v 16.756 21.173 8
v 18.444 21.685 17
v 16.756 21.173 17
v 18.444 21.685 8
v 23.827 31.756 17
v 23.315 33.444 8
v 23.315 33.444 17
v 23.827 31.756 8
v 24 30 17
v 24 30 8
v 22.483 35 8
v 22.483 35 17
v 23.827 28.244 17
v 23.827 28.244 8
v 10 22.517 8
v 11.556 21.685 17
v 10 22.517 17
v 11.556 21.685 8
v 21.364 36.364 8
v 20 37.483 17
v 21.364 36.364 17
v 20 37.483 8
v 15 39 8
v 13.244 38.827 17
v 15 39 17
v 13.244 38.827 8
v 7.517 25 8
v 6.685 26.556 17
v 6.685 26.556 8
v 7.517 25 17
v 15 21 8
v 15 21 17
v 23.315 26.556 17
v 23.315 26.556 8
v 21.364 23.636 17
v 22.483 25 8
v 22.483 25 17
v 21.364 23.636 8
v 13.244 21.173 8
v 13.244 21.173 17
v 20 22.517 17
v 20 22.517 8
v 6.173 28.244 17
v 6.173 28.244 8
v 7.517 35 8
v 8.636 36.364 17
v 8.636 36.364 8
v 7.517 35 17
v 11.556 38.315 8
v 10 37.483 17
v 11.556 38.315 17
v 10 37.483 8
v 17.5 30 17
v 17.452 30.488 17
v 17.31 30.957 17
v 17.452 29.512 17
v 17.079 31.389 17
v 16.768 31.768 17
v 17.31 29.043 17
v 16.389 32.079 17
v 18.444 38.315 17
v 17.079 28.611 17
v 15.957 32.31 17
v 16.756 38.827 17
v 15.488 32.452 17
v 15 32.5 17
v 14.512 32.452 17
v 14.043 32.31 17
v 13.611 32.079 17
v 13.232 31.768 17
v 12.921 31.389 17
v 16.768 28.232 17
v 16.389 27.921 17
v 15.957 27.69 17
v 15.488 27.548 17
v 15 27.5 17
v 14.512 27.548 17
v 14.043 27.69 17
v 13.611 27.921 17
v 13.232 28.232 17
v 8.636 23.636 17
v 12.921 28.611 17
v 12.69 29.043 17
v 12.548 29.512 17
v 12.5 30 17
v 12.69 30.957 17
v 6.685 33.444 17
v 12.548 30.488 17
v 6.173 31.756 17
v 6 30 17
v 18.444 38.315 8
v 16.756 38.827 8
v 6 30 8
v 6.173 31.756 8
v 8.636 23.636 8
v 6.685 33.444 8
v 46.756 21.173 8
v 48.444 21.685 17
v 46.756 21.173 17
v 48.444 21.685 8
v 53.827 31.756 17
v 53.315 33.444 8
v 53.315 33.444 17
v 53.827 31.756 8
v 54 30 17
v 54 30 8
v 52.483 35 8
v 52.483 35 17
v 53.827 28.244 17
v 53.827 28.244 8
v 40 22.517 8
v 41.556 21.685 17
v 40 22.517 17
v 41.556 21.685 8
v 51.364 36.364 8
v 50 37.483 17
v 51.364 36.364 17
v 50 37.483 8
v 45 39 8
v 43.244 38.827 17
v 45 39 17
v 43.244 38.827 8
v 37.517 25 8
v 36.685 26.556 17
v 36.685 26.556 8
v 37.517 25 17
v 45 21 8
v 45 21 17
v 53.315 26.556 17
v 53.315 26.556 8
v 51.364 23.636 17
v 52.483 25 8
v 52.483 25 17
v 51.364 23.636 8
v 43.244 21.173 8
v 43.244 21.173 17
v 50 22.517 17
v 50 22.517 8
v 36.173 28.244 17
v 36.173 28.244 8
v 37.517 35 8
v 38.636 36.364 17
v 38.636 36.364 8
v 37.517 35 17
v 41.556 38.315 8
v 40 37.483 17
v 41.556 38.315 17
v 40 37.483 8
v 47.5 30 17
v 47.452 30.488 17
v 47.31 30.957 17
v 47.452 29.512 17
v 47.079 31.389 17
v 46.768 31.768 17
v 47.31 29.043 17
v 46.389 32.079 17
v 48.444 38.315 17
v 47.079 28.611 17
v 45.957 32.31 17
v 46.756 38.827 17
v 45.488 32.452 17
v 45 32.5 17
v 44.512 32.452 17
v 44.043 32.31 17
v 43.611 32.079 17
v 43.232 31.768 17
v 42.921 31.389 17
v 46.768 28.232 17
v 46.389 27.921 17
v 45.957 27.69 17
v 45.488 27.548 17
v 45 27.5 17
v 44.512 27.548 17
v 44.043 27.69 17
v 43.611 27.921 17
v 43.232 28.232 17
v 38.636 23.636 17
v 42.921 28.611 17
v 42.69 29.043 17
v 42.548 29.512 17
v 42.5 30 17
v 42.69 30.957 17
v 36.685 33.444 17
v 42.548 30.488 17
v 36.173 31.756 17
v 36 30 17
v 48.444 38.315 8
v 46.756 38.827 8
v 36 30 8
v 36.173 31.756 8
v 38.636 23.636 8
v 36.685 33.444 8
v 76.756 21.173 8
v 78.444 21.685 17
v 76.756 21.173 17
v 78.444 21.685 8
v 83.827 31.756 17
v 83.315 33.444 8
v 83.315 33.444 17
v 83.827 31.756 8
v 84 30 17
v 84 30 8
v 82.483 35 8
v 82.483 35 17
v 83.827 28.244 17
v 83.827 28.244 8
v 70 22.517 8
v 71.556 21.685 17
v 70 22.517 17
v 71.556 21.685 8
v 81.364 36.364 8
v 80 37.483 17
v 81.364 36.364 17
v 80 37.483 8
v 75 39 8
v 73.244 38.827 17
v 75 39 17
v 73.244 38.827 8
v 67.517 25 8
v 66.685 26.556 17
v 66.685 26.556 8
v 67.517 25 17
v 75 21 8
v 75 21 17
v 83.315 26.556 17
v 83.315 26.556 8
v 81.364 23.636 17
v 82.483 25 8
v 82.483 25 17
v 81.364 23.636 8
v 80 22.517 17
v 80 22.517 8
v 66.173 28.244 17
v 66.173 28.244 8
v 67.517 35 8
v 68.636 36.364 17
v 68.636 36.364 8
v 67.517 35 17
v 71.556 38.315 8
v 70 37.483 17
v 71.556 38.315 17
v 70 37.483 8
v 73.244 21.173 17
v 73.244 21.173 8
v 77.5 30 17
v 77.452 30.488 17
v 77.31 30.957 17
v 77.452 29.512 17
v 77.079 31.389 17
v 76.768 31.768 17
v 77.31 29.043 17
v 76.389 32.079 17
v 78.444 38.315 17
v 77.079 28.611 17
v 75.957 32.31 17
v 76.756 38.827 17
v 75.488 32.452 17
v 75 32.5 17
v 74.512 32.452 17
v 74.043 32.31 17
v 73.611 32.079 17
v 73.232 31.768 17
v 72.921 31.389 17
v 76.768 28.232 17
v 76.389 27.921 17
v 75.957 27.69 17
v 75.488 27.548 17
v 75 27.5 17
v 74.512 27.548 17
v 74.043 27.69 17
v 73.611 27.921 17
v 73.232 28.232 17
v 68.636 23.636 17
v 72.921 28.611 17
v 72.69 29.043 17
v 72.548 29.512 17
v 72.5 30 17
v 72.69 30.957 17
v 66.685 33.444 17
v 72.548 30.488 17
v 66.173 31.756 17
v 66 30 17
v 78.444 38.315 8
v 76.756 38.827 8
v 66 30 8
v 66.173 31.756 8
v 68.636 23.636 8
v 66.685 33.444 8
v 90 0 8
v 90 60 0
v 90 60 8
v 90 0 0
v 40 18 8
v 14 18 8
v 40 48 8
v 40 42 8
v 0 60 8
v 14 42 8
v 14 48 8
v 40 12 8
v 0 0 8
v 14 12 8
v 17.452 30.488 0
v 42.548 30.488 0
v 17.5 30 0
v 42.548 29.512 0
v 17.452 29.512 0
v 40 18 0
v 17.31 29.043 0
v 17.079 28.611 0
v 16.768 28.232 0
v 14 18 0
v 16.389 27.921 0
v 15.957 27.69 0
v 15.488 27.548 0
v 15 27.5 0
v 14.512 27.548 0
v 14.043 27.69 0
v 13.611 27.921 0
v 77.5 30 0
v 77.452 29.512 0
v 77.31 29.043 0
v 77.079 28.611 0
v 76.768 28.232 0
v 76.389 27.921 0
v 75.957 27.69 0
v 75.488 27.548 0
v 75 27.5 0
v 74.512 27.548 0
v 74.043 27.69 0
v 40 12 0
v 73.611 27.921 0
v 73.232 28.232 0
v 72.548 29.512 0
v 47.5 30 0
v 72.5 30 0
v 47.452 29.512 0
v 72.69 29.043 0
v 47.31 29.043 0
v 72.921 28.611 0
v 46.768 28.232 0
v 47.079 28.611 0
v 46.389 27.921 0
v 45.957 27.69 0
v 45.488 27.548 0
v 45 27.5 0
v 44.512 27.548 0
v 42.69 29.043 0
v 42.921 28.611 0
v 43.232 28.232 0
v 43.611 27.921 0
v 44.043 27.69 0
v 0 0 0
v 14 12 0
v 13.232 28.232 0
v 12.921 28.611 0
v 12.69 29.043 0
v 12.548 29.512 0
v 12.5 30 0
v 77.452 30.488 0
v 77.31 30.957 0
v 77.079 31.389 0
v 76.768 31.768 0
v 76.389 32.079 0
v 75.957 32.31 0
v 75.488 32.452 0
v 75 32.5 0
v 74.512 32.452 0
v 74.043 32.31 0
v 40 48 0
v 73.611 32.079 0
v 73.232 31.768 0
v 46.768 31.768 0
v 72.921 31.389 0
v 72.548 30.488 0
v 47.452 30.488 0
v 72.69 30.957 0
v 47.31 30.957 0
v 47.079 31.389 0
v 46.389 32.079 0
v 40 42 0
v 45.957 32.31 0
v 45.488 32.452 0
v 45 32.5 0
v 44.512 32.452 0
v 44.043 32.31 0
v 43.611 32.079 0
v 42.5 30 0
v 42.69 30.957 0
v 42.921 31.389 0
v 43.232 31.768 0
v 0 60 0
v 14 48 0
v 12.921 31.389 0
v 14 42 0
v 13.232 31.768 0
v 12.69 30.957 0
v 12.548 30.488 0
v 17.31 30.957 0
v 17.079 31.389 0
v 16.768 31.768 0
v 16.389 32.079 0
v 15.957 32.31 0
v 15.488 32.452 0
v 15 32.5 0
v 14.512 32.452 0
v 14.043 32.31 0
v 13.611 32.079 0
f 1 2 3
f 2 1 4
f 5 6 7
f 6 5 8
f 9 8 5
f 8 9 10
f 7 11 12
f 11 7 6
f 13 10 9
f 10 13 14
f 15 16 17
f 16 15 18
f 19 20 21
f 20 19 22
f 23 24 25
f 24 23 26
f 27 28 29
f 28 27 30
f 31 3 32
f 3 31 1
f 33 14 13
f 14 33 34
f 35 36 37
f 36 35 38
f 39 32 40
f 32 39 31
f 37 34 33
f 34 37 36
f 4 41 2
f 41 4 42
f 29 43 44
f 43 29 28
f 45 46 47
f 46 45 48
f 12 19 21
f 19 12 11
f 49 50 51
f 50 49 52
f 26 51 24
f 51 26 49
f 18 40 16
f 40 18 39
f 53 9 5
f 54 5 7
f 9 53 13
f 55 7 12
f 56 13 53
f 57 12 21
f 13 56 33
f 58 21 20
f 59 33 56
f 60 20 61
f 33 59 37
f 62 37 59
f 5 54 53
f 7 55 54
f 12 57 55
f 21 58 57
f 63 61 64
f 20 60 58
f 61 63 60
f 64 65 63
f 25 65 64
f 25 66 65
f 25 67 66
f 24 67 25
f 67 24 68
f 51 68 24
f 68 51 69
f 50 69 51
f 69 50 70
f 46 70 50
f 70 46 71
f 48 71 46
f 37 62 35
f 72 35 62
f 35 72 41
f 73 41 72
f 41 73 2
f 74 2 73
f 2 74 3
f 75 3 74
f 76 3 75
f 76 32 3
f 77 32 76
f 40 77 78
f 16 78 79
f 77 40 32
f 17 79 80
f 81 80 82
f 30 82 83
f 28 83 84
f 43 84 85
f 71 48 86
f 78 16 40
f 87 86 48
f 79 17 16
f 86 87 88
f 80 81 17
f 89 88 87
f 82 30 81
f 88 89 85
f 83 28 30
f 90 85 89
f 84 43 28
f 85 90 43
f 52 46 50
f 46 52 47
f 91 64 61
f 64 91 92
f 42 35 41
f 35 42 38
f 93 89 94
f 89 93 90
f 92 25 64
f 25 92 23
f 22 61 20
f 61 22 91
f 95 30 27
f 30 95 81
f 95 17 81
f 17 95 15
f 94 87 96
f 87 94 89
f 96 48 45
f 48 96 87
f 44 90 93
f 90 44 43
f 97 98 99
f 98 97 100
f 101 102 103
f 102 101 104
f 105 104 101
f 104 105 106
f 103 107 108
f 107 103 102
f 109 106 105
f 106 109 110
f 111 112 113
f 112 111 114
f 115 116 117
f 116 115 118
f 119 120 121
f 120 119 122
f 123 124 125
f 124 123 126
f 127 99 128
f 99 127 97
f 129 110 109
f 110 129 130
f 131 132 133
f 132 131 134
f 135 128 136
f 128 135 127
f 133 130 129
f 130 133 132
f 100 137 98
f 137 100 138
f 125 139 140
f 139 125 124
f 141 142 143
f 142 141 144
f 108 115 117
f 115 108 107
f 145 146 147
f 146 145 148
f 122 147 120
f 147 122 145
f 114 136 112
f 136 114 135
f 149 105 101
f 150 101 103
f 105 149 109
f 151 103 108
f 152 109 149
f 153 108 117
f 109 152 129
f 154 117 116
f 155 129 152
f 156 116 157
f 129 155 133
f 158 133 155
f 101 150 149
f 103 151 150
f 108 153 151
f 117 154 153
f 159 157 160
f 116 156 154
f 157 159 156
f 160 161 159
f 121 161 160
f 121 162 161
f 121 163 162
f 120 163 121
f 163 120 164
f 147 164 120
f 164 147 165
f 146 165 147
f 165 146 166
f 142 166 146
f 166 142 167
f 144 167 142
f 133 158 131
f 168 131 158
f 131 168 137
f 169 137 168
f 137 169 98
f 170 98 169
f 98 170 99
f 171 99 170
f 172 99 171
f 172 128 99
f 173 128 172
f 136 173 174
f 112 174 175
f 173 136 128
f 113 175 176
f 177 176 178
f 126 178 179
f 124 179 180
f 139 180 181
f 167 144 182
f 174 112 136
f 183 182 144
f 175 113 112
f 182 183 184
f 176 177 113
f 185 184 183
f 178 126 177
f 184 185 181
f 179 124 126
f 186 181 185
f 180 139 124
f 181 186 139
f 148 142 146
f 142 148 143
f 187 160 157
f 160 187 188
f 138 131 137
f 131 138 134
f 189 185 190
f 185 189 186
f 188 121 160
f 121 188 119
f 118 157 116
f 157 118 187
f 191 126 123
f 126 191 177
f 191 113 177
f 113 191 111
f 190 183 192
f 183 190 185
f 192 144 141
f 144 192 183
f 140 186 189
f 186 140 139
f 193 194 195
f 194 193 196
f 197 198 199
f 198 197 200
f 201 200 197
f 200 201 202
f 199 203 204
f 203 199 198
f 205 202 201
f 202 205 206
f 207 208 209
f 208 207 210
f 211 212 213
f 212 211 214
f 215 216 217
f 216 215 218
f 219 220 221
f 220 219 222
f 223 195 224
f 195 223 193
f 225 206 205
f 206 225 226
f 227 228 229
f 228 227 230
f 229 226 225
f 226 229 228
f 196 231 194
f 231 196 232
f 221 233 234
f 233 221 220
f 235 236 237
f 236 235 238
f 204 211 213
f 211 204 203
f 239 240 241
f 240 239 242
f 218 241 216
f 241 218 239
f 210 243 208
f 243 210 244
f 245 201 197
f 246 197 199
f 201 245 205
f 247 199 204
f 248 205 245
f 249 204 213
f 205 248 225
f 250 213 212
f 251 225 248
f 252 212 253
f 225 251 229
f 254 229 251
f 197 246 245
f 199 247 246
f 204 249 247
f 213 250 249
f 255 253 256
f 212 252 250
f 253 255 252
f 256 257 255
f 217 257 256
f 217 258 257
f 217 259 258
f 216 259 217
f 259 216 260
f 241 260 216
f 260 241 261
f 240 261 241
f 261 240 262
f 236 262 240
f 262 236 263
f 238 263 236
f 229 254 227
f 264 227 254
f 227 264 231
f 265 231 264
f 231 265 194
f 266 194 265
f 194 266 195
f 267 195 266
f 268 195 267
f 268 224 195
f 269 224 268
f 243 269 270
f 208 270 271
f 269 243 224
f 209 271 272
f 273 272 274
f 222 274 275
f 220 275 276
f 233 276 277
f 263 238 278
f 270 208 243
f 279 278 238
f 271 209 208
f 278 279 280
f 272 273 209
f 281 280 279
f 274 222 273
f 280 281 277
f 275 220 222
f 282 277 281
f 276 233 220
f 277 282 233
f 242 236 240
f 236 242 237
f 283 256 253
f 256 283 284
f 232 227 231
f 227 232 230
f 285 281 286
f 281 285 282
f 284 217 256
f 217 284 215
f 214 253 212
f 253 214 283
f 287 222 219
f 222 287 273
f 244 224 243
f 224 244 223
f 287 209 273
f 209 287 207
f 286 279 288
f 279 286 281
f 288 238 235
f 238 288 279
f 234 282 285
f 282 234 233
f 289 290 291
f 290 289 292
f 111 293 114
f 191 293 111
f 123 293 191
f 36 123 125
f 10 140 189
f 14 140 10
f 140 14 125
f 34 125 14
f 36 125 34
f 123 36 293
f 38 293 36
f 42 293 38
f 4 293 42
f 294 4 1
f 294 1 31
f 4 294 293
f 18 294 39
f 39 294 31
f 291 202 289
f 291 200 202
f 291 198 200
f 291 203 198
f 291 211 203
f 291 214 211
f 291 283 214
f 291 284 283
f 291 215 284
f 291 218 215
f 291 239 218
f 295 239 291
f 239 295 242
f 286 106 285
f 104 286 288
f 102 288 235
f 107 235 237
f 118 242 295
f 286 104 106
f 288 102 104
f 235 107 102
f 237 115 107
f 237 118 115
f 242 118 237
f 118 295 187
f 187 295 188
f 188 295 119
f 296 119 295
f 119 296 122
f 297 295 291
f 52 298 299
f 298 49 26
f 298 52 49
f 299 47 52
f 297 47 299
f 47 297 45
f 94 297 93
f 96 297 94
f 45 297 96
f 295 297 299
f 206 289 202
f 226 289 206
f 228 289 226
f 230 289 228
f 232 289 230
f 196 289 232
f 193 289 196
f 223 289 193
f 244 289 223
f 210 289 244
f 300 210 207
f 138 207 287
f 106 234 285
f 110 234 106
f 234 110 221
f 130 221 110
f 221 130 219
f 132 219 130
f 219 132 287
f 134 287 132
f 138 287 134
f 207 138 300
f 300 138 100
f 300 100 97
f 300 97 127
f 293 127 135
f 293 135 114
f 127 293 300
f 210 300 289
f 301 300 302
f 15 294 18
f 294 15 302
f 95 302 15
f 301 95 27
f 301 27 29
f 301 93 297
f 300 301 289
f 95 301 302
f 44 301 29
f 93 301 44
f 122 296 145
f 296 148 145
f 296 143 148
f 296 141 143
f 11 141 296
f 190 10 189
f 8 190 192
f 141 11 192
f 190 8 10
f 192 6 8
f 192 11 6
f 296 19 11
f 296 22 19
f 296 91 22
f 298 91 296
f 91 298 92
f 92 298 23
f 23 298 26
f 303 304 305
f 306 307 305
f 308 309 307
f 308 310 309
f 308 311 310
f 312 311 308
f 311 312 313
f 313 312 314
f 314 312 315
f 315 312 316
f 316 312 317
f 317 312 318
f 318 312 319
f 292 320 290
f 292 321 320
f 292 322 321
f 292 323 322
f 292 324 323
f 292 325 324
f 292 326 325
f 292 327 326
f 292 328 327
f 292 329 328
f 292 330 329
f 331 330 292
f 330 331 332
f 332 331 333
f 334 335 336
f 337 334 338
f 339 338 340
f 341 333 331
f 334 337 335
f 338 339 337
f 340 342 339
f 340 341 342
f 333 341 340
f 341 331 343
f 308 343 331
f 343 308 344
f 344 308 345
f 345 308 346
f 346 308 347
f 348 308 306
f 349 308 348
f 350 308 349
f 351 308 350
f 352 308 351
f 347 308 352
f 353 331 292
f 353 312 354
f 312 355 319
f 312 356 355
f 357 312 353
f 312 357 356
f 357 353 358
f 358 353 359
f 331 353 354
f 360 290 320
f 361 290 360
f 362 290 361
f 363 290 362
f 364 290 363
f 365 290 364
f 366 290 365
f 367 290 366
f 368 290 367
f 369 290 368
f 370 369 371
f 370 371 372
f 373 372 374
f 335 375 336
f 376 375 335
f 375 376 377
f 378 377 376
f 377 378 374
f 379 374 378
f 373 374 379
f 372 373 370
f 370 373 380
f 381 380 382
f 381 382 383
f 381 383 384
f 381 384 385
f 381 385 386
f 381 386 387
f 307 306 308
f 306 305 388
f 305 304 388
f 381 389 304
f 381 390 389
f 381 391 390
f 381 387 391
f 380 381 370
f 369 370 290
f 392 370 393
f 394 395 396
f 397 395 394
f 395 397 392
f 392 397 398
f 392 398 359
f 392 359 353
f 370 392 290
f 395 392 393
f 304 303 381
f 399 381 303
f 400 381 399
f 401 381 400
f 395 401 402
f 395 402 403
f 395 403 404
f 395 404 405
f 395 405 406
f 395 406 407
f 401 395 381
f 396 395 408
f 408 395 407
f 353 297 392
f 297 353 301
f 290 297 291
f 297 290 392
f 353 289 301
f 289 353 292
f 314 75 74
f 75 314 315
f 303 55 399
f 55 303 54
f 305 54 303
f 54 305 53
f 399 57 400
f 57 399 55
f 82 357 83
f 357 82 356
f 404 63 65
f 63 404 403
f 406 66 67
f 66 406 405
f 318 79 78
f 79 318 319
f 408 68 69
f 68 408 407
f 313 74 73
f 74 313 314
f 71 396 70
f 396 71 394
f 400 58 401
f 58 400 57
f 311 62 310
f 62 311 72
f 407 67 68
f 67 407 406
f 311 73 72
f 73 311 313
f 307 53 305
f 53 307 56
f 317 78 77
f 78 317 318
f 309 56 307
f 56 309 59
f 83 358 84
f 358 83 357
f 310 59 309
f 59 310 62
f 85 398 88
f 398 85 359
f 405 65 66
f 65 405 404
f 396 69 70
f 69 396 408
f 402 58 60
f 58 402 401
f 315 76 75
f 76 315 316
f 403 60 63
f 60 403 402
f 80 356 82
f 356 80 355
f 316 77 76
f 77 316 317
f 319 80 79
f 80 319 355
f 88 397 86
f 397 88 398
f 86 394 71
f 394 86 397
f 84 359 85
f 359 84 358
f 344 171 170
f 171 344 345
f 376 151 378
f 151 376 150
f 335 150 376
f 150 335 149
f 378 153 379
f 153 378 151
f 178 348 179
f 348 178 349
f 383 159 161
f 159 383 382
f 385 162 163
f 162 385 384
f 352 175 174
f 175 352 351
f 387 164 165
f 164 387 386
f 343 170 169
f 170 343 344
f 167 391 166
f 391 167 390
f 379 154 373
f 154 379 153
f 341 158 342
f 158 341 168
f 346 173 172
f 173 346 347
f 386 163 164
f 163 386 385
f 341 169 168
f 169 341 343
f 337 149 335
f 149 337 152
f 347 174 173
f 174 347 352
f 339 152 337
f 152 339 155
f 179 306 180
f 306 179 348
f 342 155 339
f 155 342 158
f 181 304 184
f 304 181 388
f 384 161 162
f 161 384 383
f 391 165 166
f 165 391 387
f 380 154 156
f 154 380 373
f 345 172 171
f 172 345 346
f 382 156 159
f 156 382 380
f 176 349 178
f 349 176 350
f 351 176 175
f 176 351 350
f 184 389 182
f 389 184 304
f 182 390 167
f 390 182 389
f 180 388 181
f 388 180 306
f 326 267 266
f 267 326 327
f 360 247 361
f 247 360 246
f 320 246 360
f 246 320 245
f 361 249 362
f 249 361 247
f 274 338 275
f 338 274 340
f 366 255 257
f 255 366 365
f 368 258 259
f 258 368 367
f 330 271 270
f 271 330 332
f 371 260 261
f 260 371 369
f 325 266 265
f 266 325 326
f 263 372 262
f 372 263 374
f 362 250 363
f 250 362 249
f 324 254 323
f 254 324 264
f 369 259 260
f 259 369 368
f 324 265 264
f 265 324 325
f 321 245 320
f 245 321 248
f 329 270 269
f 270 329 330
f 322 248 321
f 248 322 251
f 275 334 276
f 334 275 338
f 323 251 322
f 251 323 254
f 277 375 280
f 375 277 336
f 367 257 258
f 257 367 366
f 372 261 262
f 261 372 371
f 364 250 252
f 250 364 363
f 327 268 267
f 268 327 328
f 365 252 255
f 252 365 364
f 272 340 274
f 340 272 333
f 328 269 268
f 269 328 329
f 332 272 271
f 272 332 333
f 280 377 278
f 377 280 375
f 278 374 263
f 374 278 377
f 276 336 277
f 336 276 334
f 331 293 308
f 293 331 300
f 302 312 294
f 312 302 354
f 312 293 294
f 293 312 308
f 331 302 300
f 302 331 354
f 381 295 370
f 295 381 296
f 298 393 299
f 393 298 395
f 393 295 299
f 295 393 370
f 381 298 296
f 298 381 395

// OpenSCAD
$fn = 32;

// ----------------------------------------------------------------------
// Drill jig: three_boss_slot jig
// ----------------------------------------------------------------------

// --- parameters (mm) ---
plate_l = 90;             // plate length, X
plate_w = 60;             // plate width, Y
plate_t = 8;              // plate thickness
boss_d = 18;              // guide boss diameter
boss_h = 10;              // boss height above the plate
guide_d = 5;              // guide hole diameter
boss_pitch = 30;          // boss pitch
slot_w = 6;               // clamp slot width
slot_l = 26;              // clamp slot length
slot_x = 14;              // slot start X

n_boss = 3;  // guide bosses
boss_x0 = (plate_l - (n_boss - 1) * boss_pitch) / 2;  // first boss X
boss_top = plate_t - 1 + boss_h;  // boss crown height
total_h = boss_top;  // overall height

difference() {
  union() {
  cube([plate_l, plate_w, plate_t]);
  for (i = [0 : n_boss - 1])
    translate([boss_x0 + i * boss_pitch, plate_w / 2, plate_t - 1])
      cylinder(h = boss_h, d = boss_d);
  }
  for (i = [0 : n_boss - 1])
    translate([boss_x0 + i * boss_pitch, plate_w / 2, -1])
      cylinder(h = plate_t + boss_h, d = guide_d);
  for (cy = [plate_w * 0.25, plate_w * 0.75])
    translate([slot_x, cy - slot_w / 2, -1])
      cube([slot_l, slot_w, plate_t + 2]);
}
